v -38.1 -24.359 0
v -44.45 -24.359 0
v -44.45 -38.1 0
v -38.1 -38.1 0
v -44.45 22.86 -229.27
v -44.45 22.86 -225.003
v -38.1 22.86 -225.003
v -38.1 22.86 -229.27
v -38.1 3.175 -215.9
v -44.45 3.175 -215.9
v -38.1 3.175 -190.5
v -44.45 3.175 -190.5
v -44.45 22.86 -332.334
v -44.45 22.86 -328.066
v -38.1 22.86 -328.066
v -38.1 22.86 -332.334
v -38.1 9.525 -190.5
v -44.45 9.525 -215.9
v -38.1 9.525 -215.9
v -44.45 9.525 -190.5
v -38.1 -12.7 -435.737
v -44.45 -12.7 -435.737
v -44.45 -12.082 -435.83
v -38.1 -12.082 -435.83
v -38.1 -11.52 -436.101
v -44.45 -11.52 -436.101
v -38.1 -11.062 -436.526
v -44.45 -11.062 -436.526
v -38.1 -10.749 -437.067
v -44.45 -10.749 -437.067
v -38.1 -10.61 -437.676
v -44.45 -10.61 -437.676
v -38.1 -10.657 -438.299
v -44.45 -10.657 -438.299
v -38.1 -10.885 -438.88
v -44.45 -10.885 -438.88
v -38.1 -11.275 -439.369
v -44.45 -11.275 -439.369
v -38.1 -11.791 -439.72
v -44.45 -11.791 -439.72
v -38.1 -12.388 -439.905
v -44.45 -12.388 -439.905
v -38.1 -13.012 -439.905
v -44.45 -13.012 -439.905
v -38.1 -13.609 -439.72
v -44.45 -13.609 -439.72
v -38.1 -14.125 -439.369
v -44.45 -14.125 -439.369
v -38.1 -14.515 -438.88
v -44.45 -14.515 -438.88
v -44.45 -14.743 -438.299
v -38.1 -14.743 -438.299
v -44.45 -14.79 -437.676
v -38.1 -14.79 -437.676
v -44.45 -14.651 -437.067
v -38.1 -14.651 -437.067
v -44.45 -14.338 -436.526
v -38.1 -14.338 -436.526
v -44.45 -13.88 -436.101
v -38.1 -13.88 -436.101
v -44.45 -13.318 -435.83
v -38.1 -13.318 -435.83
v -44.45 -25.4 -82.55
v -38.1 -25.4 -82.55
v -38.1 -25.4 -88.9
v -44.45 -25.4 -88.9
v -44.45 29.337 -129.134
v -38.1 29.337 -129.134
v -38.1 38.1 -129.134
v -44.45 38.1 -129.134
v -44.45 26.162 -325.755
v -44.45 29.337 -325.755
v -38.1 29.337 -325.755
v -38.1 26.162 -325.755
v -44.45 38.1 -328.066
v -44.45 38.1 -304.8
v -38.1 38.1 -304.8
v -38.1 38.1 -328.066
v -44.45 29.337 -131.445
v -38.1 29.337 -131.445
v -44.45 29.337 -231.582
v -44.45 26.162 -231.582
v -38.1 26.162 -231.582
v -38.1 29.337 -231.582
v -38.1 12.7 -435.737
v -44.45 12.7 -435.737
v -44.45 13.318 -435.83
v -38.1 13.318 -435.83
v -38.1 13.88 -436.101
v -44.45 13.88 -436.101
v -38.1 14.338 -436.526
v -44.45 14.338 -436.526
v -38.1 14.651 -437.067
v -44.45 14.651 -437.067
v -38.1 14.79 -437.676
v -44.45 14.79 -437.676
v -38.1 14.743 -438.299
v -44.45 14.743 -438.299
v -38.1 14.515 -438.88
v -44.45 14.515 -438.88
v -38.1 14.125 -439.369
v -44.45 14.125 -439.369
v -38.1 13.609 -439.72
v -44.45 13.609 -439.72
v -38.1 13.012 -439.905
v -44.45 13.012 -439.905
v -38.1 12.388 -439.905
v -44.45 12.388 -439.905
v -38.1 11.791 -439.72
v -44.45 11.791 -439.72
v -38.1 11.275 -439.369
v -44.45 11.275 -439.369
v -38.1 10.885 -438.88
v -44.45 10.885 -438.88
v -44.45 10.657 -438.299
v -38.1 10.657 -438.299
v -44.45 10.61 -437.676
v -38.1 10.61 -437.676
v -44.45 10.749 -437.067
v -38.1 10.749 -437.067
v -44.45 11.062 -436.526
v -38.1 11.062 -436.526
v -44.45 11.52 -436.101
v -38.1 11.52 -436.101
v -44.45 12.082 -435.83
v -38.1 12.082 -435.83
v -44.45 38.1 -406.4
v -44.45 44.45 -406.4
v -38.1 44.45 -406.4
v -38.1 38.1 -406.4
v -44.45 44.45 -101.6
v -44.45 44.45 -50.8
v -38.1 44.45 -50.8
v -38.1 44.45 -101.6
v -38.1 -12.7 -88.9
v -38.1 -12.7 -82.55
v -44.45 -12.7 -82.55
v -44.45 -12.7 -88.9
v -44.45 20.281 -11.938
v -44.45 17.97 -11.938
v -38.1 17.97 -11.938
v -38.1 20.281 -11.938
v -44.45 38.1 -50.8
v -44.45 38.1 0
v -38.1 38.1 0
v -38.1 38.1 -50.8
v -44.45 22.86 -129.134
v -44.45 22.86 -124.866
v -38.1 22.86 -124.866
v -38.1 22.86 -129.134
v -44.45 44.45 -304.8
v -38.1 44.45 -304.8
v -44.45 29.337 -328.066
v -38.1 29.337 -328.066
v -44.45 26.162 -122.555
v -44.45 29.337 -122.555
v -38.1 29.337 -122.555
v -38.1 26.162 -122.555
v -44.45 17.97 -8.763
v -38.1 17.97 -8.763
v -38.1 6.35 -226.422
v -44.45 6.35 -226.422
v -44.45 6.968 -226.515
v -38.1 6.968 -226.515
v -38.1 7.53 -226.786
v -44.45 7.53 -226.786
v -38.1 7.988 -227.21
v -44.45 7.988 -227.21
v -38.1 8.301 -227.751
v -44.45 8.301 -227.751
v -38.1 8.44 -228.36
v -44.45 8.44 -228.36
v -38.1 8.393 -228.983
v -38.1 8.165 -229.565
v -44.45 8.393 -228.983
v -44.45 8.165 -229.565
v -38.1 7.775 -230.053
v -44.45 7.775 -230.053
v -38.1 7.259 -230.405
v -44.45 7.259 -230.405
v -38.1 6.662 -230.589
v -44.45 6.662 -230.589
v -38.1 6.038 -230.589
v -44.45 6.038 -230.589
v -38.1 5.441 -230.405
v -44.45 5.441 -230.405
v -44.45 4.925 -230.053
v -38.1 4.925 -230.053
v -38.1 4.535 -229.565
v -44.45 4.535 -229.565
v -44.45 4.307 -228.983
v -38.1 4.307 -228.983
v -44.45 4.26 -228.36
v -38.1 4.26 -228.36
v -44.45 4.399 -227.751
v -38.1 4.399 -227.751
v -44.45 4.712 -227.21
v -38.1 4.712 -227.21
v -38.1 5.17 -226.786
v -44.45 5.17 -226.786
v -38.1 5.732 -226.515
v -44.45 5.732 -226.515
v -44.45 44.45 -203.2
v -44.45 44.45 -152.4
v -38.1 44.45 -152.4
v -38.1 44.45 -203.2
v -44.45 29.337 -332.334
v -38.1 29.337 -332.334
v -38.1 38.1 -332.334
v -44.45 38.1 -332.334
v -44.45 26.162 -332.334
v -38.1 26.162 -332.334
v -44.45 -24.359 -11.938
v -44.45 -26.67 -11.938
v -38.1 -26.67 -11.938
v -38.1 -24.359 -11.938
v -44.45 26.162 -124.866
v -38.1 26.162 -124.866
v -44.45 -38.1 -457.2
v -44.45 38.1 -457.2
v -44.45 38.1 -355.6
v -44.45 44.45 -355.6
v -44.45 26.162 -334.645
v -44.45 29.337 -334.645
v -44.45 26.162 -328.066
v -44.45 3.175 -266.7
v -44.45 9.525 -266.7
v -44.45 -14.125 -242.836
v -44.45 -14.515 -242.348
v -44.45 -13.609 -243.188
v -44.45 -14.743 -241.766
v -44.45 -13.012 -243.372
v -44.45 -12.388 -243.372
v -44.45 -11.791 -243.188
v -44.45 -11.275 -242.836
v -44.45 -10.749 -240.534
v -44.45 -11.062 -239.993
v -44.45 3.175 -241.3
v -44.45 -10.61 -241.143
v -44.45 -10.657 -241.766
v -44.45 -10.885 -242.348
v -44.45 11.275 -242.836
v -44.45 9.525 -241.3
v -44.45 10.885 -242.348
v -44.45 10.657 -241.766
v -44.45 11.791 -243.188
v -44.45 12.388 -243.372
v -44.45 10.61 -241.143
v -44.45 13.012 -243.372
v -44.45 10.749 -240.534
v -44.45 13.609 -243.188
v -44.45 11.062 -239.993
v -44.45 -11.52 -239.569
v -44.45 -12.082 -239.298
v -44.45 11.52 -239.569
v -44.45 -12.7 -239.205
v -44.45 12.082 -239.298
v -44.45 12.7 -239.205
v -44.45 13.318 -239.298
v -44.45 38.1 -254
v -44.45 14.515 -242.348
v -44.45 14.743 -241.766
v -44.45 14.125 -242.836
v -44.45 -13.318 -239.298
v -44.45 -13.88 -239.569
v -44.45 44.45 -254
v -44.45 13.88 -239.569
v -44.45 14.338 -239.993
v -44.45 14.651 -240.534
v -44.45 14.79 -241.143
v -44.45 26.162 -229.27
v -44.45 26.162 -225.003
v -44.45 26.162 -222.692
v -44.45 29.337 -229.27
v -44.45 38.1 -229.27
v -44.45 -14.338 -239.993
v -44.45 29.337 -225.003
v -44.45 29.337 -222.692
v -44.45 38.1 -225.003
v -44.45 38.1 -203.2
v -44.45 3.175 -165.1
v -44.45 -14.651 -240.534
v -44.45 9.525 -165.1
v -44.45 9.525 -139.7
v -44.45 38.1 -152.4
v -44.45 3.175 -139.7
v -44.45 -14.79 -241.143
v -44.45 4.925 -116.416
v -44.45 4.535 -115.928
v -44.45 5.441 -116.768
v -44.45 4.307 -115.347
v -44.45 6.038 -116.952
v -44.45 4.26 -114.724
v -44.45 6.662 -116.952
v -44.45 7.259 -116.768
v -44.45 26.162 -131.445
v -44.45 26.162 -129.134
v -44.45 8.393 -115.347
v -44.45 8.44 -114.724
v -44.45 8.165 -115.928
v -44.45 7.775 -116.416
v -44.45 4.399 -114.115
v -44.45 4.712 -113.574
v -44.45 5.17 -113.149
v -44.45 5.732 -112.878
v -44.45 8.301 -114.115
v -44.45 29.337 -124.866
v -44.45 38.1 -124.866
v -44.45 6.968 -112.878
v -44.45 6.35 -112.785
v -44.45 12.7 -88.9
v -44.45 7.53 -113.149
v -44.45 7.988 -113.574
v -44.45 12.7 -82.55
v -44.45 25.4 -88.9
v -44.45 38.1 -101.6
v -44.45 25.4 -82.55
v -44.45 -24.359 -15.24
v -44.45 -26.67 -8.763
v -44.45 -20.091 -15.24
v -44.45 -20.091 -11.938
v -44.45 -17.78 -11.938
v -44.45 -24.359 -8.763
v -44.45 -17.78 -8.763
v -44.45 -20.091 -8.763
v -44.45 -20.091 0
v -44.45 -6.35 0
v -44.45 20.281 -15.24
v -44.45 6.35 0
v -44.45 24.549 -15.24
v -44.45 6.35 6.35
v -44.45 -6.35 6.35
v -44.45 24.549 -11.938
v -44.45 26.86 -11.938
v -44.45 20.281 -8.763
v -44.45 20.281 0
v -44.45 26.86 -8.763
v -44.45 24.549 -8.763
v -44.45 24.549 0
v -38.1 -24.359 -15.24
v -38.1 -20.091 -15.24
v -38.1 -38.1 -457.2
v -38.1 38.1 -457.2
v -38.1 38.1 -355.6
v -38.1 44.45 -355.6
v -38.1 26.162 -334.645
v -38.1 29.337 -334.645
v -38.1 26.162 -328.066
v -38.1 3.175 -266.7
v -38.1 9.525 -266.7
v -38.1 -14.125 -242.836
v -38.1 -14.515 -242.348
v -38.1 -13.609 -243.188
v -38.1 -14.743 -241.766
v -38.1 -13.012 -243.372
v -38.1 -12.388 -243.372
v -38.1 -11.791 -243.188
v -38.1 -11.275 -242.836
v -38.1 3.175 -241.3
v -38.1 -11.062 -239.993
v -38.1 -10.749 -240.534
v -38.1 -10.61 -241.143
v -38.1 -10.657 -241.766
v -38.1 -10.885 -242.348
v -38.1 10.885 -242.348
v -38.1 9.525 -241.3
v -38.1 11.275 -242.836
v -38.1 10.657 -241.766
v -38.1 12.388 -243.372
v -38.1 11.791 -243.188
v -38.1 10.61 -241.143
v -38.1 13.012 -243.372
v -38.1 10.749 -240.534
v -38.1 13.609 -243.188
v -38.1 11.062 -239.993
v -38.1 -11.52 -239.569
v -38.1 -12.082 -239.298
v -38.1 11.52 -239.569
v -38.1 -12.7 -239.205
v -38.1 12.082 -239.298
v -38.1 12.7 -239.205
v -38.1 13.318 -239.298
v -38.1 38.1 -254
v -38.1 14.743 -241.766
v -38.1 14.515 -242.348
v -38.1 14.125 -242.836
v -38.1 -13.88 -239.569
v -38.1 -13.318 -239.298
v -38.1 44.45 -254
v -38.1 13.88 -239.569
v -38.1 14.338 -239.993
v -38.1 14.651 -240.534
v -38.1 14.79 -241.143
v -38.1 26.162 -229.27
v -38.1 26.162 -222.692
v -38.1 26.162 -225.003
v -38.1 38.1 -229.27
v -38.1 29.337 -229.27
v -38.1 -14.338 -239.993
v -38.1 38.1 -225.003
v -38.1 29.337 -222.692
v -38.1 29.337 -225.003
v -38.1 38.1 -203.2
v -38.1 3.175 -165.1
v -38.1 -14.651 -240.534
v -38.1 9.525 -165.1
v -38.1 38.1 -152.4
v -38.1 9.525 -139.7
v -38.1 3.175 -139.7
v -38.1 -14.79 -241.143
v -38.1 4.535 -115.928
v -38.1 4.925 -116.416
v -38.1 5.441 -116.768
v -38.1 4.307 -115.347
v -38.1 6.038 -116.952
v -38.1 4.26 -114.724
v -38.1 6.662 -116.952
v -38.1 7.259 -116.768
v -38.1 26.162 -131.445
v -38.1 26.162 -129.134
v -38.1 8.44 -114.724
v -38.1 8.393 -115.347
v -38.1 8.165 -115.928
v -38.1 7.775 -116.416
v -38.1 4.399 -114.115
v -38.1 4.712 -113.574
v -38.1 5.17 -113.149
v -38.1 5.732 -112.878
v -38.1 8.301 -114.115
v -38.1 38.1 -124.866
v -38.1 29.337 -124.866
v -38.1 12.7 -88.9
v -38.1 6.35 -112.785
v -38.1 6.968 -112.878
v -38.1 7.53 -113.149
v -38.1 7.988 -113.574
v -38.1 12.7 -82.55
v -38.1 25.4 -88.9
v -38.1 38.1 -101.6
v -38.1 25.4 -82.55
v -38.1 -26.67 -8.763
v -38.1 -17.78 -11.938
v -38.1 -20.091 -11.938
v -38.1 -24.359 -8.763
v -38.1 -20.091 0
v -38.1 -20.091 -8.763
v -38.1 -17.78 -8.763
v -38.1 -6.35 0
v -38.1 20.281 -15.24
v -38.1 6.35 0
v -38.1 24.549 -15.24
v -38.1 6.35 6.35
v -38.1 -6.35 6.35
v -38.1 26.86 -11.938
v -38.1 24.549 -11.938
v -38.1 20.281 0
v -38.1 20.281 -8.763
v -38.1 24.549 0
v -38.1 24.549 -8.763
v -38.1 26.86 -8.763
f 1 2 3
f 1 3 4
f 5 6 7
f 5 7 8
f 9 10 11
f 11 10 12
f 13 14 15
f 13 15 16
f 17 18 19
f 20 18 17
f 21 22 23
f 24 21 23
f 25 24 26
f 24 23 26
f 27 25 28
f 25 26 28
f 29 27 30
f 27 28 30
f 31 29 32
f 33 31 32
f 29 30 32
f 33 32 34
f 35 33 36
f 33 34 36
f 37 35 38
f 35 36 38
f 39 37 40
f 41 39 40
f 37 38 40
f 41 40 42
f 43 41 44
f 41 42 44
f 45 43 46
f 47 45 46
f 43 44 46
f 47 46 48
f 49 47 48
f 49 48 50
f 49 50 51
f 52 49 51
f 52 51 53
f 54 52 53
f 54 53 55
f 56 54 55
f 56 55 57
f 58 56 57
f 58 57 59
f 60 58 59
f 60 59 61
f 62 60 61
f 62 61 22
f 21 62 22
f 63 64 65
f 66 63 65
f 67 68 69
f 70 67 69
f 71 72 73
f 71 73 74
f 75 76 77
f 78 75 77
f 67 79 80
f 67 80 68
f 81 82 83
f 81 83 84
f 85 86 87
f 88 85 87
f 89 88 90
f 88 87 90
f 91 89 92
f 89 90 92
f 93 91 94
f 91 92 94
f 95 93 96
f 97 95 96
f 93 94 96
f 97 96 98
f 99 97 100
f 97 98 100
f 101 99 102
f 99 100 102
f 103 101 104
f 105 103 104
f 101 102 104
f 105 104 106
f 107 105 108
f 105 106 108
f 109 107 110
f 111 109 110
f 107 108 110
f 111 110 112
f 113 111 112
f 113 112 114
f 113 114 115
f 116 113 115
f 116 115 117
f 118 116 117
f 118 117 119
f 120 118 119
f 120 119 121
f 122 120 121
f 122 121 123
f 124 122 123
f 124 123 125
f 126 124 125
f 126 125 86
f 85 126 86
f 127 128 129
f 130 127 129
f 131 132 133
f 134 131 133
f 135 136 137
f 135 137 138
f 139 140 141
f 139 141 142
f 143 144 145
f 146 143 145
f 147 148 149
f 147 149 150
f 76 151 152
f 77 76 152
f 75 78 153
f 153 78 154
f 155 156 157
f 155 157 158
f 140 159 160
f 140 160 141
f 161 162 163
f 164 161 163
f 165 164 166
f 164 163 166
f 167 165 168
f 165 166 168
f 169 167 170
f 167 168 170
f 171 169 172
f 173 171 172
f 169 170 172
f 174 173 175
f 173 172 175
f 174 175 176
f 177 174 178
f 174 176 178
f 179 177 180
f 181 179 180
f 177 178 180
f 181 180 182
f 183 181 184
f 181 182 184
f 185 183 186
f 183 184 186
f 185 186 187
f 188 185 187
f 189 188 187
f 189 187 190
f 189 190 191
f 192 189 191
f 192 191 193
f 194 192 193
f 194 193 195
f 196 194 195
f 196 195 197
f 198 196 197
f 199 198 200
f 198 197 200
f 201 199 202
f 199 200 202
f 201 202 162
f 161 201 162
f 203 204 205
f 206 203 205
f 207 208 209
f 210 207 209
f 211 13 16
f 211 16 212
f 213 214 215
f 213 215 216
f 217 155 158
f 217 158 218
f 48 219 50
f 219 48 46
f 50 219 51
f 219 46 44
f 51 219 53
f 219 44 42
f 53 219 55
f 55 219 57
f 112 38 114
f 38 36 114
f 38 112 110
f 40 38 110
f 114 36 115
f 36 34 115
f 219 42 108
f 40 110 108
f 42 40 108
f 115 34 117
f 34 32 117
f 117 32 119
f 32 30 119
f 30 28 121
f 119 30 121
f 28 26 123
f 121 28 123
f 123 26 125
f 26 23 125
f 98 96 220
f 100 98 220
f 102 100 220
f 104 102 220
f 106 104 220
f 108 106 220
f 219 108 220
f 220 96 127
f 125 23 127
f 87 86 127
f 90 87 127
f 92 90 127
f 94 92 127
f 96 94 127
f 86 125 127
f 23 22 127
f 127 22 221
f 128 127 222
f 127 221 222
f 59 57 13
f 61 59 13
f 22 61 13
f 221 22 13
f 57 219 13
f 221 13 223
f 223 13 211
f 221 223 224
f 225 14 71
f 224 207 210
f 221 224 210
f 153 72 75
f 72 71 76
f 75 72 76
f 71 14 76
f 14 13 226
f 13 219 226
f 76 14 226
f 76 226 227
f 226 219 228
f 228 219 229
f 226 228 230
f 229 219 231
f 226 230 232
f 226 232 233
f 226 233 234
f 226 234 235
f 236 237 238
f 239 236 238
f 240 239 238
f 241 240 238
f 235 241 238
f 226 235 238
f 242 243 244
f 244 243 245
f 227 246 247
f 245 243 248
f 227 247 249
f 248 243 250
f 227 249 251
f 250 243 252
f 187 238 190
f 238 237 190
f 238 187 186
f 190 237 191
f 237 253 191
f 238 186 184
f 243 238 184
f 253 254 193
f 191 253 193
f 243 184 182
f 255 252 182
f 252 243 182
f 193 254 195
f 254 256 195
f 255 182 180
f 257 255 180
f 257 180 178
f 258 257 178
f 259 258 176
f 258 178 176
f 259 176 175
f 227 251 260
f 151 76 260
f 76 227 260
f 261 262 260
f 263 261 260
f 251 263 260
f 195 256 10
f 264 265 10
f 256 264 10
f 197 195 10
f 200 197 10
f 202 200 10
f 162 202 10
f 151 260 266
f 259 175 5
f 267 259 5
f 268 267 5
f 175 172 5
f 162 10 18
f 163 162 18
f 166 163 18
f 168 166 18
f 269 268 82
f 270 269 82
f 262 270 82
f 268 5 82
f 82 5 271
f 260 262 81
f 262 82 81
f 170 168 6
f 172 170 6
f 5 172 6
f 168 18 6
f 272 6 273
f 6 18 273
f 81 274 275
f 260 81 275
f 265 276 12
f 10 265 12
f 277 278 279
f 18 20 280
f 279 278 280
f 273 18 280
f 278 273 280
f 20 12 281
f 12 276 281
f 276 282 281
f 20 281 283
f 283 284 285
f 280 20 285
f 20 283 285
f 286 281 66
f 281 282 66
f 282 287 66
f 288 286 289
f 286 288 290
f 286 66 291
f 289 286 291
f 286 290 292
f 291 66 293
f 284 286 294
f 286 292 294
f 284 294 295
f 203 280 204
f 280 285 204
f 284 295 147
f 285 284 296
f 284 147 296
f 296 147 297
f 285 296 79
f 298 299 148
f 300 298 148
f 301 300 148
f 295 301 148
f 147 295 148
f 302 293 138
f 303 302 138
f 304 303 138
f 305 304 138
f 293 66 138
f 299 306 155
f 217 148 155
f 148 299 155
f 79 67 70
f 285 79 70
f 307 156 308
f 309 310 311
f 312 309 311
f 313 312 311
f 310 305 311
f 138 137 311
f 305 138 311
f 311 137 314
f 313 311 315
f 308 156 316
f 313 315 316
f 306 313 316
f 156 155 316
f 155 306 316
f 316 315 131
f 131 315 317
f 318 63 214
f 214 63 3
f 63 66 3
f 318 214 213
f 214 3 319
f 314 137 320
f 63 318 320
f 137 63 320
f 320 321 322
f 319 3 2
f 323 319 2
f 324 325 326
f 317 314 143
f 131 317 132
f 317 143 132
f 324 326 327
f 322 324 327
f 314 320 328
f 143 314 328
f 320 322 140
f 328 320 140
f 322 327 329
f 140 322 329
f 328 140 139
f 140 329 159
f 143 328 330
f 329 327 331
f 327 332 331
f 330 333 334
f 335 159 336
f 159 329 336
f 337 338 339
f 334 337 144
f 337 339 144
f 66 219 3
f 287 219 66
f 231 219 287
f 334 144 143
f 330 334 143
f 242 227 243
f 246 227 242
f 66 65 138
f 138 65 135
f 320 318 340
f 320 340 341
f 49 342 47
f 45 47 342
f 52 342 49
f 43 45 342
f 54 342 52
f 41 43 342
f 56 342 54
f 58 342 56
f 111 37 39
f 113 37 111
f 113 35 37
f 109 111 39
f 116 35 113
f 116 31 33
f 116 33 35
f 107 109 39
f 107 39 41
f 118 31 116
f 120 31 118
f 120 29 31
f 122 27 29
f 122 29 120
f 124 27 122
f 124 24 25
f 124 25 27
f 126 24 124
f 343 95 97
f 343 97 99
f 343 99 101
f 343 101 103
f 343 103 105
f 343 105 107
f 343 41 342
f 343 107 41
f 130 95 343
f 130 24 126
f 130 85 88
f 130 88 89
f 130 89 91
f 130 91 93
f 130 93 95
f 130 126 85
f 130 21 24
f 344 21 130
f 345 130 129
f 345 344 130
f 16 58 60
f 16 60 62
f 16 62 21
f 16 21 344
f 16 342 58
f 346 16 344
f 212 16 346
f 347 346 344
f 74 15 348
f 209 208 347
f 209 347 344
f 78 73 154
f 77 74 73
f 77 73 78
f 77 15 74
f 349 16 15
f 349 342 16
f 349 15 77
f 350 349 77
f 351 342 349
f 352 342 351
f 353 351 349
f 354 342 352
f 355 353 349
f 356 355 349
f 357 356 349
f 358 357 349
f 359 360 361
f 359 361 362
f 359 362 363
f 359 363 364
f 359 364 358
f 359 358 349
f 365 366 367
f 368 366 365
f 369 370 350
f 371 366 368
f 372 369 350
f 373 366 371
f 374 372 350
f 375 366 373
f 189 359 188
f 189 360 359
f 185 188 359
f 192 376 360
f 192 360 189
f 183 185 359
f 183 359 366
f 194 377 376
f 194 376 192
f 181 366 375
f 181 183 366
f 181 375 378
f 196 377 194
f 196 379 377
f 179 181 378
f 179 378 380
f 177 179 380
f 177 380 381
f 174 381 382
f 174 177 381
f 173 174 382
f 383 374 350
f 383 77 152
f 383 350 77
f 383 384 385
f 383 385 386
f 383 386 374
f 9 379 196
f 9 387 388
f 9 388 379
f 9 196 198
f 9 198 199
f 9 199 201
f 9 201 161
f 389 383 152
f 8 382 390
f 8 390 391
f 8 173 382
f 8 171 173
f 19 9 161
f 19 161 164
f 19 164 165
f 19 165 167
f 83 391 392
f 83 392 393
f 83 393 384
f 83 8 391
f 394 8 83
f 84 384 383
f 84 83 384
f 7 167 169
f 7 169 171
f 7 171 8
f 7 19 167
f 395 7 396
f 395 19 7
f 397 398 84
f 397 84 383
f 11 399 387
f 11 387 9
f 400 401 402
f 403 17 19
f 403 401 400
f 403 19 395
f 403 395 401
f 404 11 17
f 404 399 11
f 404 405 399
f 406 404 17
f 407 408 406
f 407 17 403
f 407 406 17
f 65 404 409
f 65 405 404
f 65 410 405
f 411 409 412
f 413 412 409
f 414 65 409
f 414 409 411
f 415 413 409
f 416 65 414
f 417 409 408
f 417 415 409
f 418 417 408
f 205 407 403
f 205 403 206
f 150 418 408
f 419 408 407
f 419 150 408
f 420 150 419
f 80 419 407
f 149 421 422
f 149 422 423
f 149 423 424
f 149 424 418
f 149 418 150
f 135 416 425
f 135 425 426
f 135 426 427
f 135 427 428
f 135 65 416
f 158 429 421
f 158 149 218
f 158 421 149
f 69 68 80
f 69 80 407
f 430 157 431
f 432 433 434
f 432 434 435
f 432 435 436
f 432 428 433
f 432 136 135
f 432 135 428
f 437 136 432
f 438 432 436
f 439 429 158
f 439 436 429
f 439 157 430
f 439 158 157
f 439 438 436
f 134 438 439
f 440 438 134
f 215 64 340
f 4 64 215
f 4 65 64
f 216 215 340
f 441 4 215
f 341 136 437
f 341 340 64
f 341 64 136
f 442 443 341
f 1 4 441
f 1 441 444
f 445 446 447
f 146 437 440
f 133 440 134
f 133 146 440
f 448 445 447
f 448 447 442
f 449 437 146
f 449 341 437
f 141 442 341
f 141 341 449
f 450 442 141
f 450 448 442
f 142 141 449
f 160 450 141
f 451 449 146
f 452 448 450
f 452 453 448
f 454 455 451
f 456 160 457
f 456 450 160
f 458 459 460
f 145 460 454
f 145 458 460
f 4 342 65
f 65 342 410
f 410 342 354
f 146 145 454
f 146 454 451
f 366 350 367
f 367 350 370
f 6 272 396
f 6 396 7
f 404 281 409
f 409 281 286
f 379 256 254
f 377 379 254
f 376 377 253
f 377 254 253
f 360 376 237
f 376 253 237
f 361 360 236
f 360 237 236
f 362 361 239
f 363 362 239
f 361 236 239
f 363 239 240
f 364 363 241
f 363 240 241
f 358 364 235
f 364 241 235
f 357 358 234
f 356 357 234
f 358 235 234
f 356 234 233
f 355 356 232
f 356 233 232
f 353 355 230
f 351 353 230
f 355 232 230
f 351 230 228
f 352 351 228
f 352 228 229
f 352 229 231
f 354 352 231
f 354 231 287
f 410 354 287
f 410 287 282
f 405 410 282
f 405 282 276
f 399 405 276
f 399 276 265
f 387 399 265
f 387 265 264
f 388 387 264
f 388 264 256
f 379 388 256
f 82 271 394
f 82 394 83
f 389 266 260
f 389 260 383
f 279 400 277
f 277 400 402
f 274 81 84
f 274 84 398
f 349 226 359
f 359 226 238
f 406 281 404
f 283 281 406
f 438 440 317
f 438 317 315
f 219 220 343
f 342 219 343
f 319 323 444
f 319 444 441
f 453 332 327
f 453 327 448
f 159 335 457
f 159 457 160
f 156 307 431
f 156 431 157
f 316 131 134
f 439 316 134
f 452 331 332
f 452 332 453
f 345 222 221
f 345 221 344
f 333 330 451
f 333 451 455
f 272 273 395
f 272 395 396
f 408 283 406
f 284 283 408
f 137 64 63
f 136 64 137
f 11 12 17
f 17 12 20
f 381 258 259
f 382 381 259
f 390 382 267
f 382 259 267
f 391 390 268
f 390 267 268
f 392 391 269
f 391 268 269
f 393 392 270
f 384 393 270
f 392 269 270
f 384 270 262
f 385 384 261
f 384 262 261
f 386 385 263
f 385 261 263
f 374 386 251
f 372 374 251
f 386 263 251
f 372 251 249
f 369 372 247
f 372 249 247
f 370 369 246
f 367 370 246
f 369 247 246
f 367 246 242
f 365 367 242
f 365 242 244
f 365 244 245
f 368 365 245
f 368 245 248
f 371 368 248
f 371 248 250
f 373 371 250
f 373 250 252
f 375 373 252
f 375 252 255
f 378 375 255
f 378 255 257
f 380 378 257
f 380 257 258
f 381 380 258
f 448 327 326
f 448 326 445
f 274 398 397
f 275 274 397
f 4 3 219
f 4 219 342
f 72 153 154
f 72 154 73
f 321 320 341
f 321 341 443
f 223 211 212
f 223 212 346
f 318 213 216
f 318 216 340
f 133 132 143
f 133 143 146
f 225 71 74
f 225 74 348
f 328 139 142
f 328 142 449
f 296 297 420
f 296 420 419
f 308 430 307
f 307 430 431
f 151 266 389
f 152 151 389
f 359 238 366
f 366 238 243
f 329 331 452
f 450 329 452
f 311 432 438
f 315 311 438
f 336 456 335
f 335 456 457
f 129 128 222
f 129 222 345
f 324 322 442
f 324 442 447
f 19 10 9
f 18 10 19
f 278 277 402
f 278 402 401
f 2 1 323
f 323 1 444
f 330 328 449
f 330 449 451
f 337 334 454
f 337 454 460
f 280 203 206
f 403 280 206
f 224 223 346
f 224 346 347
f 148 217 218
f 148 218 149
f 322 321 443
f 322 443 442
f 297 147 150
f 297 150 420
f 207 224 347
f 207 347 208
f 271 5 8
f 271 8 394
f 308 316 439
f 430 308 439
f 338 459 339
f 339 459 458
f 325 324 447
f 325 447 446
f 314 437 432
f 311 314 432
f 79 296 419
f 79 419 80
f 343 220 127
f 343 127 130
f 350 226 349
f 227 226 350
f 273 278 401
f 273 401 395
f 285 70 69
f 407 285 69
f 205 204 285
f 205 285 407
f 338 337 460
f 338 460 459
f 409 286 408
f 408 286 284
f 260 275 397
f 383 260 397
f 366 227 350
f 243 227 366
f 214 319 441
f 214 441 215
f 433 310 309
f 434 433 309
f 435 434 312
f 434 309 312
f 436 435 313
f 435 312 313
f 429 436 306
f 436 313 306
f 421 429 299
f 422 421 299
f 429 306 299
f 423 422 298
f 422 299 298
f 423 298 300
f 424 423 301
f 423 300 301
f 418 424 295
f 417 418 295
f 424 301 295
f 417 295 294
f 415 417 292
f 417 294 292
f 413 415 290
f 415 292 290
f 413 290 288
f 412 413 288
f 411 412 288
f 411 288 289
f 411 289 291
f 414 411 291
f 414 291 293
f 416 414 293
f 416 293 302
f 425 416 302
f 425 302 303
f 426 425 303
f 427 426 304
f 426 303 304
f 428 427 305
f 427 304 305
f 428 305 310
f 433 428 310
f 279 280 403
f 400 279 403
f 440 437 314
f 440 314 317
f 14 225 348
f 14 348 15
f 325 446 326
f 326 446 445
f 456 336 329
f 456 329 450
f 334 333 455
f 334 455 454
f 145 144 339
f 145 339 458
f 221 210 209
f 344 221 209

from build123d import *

# Parameters (mm, degrees)
SKETCH1_W           = 6.35
SKETCH1_H           = 76.2
BOSS_EXTRUDE1_DEPTH = 457.2
SKETCH2_W           = 6.35
SKETCH2_H           = 50.8
BOSS_EXTRUDE2_DEPTH = 6.35
SKETCH3_W           = 6.35
SKETCH3_H           = 12.7
CUT_EXTRUDE1_DEPTH  = 460.399570091
SKETCH4_W           = 6.35
SKETCH4_H           = 12.7
BOSS_EXTRUDE4_DEPTH = 6.35
SKETCH7_R           = 2.0955
CUT_EXTRUDE2_DEPTH  = 460.399570091
SKETCH9_R           = 2.0955
SKETCH9_W           = 25.4
SKETCH9_H           = 6.35
CUT_EXTRUDE3_DEPTH  = 6.35
CUT_EXTRUDE4_DEPTH  = 6.35


with BuildPart() as part:
    # Sketch1 → Boss-Extrude1 (new body)
    with BuildSketch(Plane.XY):
        with Locations((-41.275, 0)):
            Rectangle(SKETCH1_W, SKETCH1_H)
    extrude(amount=-BOSS_EXTRUDE1_DEPTH)

    # Sketch2 → Boss-Extrude2 (add)
    with BuildSketch(Plane(origin=(0, 38.1, 0), x_dir=(1, 0, 0), z_dir=(0, 1, 0))):
        with Locations((-41.275, 381)):
            Rectangle(SKETCH2_W, SKETCH2_H)
        with Locations((-41.275, 279.4)):
            Rectangle(SKETCH2_W, SKETCH2_H)
        with Locations((-41.275, 177.8)):
            Rectangle(SKETCH2_W, SKETCH2_H)
        with Locations((-41.275, 76.2)):
            Rectangle(SKETCH2_W, SKETCH2_H)
    extrude(amount=BOSS_EXTRUDE2_DEPTH)

    # Sketch3 → Cut-Extrude1 (cut, through all)
    with BuildSketch(Plane(origin=(-38.1, 0, 0), x_dir=(0, 0, -1), z_dir=(1, 0, 0))):
        with Locations((85.725, 19.05)):
            Rectangle(SKETCH3_W, SKETCH3_H)
        with Locations((85.725, -19.05)):
            Rectangle(SKETCH3_W, SKETCH3_H)
    extrude(amount=-CUT_EXTRUDE1_DEPTH, mode=Mode.SUBTRACT)

    # Sketch4 → Boss-Extrude4 (add)
    with BuildSketch(Plane.XY):
        with Locations((-41.275, 0)):
            Rectangle(SKETCH4_W, SKETCH4_H)
    extrude(amount=BOSS_EXTRUDE4_DEPTH)

    # Sketch7 → Cut-Extrude2 (cut, through all)
    with BuildSketch(Plane.ZY.offset(44.45)):
        with Locations((-241.3, -12.7)):
            Circle(SKETCH7_R)
        with Locations((-241.3, 12.7)):
            Circle(SKETCH7_R)
        with Locations((-437.8325, -12.7)):
            Circle(SKETCH7_R)
        with Locations((-437.8325, 12.7)):
            Circle(SKETCH7_R)
    extrude(amount=-CUT_EXTRUDE2_DEPTH, mode=Mode.SUBTRACT)

    # Sketch9 → Cut-Extrude3 (cut)
    with BuildSketch(Plane.ZY.offset(44.45)):
        with Locations((-114.880216651, 6.35)):
            Circle(SKETCH9_R)
        with Locations((-228.517018256, 6.35)):
            Circle(SKETCH9_R)
        with Locations((-254, 6.35)):
            Rectangle(SKETCH9_W, SKETCH9_H)
        with Locations((-203.2, 6.35)):
            Rectangle(SKETCH9_W, SKETCH9_H)
        with Locations((-152.4, 6.35)):
            Rectangle(SKETCH9_W, SKETCH9_H)
    extrude(amount=-CUT_EXTRUDE3_DEPTH, mode=Mode.SUBTRACT)

    # Sketch10 → Cut-Extrude4 (cut)
    with BuildSketch(Plane(origin=(-38.1, 0, 0), x_dir=(0, 0, -1), z_dir=(1, 0, 0))):
        Polygon((0, 24.548534751), (0, 20.281334751), (8.763, 20.281334751), (8.763, 17.969934751), (11.938, 17.969934751), (11.938, 20.281334751), (15.24, 20.281334751), (15.24, 24.548534751), (11.938, 24.548534751), (11.938, 26.859934751), (8.763, 26.859934751), (8.763, 24.548534751), align=None)
        Polygon((0, -20.0914), (0, -24.3586), (8.763, -24.3586), (8.763, -26.67), (11.938, -26.67), (11.938, -24.3586), (15.24, -24.3586), (15.24, -20.0914), (11.938, -20.0914), (11.938, -17.78), (8.763, -17.78), (8.763, -20.0914), align=None)
        Polygon((332.3336, 38.1), (328.0664, 38.1), (328.0664, 29.337), (325.755, 29.337), (325.755, 26.162), (328.0664, 26.162), (328.0664, 22.86), (332.3336, 22.86), (332.3336, 26.162), (334.645, 26.162), (334.645, 29.337), (332.3336, 29.337), align=None)
        Polygon((229.270305867, 38.1), (225.003105867, 38.1), (225.003105867, 29.337), (222.691705867, 29.337), (222.691705867, 26.162), (225.003105867, 26.162), (225.003105867, 22.86), (229.270305867, 22.86), (229.270305867, 26.162), (231.581705867, 26.162), (231.581705867, 29.337), (229.270305867, 29.337), align=None)
        Polygon((129.1336, 38.1), (124.8664, 38.1), (124.8664, 29.337), (122.555, 29.337), (122.555, 26.162), (124.8664, 26.162), (124.8664, 22.86), (129.1336, 22.86), (129.1336, 26.162), (131.445, 26.162), (131.445, 29.337), (129.1336, 29.337), align=None)
    extrude(amount=-CUT_EXTRUDE4_DEPTH, mode=Mode.SUBTRACT)


solid = part.part
